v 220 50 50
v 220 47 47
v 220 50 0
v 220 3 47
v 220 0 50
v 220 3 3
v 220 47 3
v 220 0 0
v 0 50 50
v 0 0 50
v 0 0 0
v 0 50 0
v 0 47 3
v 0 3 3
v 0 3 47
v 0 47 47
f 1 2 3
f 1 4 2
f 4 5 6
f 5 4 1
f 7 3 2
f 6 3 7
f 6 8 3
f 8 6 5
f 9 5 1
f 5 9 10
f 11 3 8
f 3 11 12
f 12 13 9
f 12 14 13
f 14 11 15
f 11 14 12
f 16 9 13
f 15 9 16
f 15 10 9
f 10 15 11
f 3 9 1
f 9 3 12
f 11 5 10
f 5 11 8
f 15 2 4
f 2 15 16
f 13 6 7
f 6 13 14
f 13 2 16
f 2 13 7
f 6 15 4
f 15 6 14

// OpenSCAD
$fn = 32;

// ----------------------------------------------------------------------
// Box beam: 200-250 mm hollow beam
// ----------------------------------------------------------------------

// --- parameters (mm) ---
beam_l = 220;             // beam length, X
beam_w = 50;              // beam width, Y
beam_h = 50;              // beam height, Z
wall = 3;                 // wall thickness

difference() {
  cube([beam_l, beam_w, beam_h]);
  translate([-1, wall, wall])
    cube([beam_l + 2, beam_w - 2 * wall, beam_h - 2 * wall]);
}
